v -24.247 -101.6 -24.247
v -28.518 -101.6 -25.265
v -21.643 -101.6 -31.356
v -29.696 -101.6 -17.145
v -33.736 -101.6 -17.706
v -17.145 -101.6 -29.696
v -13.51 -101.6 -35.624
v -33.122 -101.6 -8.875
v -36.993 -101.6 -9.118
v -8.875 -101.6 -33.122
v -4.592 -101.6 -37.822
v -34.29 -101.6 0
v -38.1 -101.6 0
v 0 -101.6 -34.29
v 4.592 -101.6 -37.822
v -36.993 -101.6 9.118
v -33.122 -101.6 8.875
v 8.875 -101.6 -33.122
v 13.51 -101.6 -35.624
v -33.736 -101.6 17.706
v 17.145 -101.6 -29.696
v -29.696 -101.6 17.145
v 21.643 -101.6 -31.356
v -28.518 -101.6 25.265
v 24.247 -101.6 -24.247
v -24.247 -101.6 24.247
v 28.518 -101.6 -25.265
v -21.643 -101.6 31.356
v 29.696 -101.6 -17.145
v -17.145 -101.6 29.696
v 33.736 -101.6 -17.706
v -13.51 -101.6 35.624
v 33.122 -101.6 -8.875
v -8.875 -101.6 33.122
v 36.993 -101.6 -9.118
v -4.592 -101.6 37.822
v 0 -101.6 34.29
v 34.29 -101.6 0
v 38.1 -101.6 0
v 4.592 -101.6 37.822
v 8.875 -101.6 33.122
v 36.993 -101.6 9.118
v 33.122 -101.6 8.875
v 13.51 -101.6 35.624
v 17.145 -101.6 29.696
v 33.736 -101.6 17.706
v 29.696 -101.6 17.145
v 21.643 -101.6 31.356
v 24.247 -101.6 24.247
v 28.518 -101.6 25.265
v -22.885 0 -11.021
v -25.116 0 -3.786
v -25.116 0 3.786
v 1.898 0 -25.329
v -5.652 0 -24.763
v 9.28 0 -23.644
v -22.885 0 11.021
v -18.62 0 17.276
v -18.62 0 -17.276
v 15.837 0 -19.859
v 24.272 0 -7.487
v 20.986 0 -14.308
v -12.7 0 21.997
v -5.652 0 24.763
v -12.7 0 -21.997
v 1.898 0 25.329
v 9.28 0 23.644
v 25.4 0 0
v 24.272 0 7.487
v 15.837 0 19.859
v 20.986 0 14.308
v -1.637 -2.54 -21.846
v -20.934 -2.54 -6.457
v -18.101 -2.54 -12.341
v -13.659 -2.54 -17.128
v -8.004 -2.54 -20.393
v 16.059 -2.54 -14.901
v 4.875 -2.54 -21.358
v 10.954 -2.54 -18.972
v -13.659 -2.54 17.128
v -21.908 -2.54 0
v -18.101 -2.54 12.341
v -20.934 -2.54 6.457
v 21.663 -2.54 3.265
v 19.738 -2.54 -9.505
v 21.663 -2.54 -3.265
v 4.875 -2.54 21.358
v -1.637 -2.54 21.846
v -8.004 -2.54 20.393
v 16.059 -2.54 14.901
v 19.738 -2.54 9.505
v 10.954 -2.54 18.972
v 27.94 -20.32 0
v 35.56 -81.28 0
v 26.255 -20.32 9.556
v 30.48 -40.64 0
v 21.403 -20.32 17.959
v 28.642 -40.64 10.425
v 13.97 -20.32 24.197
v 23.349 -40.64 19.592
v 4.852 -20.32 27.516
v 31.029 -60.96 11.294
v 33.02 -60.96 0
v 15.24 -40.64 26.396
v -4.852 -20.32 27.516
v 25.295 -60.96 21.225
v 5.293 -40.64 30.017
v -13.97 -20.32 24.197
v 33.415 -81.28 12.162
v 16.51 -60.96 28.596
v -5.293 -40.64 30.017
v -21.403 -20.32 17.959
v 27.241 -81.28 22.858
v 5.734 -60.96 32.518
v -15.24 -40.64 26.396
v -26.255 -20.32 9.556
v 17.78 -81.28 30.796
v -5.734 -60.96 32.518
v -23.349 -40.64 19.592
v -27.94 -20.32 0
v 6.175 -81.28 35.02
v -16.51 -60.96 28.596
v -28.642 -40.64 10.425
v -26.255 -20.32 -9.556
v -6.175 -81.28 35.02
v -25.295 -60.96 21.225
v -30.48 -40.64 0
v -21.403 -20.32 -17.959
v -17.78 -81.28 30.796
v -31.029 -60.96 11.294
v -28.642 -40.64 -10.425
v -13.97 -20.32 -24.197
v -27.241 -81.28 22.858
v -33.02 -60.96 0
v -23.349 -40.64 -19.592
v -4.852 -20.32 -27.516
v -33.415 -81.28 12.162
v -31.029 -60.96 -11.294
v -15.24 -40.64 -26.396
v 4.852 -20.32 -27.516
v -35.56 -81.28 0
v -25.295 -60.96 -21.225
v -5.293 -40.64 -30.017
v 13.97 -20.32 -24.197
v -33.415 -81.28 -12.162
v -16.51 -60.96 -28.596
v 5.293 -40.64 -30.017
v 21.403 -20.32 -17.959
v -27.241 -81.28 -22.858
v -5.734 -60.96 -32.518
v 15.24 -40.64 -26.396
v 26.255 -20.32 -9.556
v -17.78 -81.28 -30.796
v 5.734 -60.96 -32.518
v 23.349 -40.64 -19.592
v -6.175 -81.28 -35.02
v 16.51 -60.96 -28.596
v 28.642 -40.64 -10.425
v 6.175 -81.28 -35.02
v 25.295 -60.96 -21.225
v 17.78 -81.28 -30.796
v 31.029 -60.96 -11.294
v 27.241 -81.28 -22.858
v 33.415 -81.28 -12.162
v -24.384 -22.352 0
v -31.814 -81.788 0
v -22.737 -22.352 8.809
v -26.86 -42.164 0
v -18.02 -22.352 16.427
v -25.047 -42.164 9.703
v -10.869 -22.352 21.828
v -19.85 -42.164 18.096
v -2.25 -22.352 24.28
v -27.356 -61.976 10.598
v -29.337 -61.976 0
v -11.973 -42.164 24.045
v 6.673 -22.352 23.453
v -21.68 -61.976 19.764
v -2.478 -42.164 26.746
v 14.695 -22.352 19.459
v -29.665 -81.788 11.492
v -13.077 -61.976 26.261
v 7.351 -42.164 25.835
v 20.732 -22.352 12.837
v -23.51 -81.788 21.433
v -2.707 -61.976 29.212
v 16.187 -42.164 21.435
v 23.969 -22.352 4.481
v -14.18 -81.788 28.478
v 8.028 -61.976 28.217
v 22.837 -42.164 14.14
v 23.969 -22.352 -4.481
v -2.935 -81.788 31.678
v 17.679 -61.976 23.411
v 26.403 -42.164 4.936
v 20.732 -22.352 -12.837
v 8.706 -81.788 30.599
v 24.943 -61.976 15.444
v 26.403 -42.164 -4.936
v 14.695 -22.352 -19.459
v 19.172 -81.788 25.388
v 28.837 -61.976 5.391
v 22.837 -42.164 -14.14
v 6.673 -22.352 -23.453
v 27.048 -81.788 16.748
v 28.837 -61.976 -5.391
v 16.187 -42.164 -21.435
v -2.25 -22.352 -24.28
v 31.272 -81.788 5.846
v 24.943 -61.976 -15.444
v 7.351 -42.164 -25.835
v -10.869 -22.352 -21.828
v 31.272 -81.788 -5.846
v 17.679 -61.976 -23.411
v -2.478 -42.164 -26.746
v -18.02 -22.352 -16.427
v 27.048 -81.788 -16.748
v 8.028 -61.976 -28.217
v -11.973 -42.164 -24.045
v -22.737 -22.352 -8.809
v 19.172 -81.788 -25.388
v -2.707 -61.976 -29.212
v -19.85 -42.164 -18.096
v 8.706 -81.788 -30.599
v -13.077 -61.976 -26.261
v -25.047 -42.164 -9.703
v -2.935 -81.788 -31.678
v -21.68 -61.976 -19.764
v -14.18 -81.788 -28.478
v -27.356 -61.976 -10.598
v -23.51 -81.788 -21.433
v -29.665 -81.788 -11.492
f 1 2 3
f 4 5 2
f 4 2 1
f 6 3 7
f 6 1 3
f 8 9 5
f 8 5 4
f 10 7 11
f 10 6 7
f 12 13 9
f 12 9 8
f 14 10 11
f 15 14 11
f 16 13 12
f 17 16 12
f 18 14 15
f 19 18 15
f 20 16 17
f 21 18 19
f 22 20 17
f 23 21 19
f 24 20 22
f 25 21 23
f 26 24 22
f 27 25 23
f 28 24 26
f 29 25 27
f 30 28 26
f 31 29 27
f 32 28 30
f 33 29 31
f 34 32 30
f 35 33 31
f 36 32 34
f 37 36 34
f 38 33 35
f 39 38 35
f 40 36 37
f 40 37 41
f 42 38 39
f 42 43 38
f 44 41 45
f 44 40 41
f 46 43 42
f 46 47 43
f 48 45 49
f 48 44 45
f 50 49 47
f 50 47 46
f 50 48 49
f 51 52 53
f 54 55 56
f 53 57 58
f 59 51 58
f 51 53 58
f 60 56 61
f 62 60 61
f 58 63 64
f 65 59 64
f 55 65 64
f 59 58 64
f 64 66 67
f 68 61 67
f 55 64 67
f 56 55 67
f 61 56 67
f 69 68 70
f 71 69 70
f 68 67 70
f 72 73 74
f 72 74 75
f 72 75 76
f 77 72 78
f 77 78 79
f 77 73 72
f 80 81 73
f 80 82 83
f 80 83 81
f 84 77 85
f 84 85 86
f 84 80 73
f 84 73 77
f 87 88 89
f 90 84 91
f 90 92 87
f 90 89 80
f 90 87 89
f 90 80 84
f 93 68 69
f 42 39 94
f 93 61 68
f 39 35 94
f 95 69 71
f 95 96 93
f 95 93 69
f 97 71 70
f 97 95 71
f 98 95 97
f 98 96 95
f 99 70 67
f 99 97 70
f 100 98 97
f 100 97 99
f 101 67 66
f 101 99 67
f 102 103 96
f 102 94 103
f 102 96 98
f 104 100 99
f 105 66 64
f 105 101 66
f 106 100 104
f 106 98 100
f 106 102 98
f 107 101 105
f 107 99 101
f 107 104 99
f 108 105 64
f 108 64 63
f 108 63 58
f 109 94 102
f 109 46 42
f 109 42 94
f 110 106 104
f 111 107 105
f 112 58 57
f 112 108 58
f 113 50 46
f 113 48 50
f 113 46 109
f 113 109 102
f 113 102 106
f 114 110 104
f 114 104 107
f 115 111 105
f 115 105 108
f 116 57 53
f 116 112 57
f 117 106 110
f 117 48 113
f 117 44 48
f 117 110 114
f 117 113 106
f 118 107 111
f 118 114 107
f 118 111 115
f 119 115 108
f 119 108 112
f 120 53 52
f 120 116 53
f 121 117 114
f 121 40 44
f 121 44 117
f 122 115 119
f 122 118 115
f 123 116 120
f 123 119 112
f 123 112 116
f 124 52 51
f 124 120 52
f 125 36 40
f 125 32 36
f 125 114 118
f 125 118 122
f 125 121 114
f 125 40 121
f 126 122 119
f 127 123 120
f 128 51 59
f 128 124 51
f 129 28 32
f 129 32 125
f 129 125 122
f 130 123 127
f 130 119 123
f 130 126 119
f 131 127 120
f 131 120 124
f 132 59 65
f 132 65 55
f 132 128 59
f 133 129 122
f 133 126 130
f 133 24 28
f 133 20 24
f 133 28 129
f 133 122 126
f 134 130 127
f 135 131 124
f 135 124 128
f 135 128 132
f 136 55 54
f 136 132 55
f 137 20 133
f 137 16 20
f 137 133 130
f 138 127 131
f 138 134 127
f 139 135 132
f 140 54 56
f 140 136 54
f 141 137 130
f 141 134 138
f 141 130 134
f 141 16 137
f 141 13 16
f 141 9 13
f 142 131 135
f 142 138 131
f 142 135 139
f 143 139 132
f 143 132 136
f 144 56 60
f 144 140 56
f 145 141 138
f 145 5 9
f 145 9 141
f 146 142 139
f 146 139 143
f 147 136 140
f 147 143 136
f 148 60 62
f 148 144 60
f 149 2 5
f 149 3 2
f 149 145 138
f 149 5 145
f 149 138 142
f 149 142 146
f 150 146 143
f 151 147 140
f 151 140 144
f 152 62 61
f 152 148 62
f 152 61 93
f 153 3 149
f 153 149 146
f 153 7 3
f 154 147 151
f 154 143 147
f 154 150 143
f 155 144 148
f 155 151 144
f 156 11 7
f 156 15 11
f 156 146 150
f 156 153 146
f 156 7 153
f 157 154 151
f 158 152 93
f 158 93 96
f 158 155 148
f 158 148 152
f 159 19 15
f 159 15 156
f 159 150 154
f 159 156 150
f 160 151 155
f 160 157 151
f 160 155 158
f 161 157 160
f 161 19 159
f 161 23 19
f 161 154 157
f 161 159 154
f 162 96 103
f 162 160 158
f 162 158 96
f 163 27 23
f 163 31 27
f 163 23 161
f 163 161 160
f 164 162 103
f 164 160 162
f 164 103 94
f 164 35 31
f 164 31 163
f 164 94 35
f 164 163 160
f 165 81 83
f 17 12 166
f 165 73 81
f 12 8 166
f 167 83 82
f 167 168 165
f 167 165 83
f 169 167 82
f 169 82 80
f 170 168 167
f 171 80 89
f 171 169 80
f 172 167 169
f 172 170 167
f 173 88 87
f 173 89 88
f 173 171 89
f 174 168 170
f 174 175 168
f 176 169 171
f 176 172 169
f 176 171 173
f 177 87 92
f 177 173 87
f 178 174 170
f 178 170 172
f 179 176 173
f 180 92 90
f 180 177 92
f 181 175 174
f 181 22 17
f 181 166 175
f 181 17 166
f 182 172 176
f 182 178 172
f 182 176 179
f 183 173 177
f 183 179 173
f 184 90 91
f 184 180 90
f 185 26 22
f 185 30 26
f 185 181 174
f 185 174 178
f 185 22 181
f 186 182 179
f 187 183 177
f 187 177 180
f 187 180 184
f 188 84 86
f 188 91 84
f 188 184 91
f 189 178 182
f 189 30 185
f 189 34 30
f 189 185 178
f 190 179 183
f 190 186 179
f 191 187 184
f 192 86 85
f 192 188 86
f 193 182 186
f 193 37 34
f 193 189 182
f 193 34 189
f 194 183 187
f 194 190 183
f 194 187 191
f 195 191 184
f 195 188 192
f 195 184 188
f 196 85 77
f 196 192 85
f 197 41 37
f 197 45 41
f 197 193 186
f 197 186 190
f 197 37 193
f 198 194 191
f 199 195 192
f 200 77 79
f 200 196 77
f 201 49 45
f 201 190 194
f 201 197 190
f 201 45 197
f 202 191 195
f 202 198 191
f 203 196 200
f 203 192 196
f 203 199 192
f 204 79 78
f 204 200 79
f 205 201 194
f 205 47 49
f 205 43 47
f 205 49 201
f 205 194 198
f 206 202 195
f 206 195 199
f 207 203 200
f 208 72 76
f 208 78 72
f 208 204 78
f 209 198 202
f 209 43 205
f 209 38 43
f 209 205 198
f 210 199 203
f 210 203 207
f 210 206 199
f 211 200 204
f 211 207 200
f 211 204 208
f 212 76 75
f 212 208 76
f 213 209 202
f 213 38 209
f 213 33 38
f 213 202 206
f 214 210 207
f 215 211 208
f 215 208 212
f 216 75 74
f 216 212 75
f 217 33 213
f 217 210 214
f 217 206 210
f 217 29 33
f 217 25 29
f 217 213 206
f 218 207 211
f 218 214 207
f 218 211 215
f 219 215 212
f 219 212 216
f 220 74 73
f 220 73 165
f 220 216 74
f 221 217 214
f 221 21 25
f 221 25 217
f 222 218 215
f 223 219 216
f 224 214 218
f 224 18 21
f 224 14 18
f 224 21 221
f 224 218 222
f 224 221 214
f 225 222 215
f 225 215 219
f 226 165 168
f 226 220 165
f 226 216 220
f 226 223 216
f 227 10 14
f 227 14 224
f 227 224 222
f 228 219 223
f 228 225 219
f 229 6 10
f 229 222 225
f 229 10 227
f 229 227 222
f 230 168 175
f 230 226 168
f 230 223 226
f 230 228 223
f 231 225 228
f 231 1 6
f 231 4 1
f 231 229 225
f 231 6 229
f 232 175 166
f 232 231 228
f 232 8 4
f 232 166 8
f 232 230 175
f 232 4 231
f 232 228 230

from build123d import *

# Parameters (mm, degrees)
F0_R     = 25.4
F2_R     = 38.1
F5_R     = 21.59
F4_R     = 34.29
F7_R     = 24.9738959908
F8_DEPTH = 2.54


with BuildPart() as f3:
    # F0 (on Front) → F3 section 0
    with BuildSketch(Plane.XZ):
        Circle(F0_R)
    # F2 (on offset) → F3 section 1
    with BuildSketch(Plane.XZ.offset(101.6)):
        Circle(F2_R)
    loft()

    # F5 (on face) → F6 section 0
    with BuildSketch(Plane(origin=(0, 0, 0), x_dir=(-1, 0, 0), z_dir=(0, 1, 0))):
        Circle(F5_R)
    # F4 (on face) → F6 section 1
    with BuildSketch(Plane.XZ.offset(101.6)):
        Circle(F4_R)
    loft(mode=Mode.SUBTRACT)

    # F7 (on Front) → F8 (join)
    with BuildSketch(Plane.XZ):
        Circle(F7_R)
    extrude(amount=F8_DEPTH)


solid = f3.part
